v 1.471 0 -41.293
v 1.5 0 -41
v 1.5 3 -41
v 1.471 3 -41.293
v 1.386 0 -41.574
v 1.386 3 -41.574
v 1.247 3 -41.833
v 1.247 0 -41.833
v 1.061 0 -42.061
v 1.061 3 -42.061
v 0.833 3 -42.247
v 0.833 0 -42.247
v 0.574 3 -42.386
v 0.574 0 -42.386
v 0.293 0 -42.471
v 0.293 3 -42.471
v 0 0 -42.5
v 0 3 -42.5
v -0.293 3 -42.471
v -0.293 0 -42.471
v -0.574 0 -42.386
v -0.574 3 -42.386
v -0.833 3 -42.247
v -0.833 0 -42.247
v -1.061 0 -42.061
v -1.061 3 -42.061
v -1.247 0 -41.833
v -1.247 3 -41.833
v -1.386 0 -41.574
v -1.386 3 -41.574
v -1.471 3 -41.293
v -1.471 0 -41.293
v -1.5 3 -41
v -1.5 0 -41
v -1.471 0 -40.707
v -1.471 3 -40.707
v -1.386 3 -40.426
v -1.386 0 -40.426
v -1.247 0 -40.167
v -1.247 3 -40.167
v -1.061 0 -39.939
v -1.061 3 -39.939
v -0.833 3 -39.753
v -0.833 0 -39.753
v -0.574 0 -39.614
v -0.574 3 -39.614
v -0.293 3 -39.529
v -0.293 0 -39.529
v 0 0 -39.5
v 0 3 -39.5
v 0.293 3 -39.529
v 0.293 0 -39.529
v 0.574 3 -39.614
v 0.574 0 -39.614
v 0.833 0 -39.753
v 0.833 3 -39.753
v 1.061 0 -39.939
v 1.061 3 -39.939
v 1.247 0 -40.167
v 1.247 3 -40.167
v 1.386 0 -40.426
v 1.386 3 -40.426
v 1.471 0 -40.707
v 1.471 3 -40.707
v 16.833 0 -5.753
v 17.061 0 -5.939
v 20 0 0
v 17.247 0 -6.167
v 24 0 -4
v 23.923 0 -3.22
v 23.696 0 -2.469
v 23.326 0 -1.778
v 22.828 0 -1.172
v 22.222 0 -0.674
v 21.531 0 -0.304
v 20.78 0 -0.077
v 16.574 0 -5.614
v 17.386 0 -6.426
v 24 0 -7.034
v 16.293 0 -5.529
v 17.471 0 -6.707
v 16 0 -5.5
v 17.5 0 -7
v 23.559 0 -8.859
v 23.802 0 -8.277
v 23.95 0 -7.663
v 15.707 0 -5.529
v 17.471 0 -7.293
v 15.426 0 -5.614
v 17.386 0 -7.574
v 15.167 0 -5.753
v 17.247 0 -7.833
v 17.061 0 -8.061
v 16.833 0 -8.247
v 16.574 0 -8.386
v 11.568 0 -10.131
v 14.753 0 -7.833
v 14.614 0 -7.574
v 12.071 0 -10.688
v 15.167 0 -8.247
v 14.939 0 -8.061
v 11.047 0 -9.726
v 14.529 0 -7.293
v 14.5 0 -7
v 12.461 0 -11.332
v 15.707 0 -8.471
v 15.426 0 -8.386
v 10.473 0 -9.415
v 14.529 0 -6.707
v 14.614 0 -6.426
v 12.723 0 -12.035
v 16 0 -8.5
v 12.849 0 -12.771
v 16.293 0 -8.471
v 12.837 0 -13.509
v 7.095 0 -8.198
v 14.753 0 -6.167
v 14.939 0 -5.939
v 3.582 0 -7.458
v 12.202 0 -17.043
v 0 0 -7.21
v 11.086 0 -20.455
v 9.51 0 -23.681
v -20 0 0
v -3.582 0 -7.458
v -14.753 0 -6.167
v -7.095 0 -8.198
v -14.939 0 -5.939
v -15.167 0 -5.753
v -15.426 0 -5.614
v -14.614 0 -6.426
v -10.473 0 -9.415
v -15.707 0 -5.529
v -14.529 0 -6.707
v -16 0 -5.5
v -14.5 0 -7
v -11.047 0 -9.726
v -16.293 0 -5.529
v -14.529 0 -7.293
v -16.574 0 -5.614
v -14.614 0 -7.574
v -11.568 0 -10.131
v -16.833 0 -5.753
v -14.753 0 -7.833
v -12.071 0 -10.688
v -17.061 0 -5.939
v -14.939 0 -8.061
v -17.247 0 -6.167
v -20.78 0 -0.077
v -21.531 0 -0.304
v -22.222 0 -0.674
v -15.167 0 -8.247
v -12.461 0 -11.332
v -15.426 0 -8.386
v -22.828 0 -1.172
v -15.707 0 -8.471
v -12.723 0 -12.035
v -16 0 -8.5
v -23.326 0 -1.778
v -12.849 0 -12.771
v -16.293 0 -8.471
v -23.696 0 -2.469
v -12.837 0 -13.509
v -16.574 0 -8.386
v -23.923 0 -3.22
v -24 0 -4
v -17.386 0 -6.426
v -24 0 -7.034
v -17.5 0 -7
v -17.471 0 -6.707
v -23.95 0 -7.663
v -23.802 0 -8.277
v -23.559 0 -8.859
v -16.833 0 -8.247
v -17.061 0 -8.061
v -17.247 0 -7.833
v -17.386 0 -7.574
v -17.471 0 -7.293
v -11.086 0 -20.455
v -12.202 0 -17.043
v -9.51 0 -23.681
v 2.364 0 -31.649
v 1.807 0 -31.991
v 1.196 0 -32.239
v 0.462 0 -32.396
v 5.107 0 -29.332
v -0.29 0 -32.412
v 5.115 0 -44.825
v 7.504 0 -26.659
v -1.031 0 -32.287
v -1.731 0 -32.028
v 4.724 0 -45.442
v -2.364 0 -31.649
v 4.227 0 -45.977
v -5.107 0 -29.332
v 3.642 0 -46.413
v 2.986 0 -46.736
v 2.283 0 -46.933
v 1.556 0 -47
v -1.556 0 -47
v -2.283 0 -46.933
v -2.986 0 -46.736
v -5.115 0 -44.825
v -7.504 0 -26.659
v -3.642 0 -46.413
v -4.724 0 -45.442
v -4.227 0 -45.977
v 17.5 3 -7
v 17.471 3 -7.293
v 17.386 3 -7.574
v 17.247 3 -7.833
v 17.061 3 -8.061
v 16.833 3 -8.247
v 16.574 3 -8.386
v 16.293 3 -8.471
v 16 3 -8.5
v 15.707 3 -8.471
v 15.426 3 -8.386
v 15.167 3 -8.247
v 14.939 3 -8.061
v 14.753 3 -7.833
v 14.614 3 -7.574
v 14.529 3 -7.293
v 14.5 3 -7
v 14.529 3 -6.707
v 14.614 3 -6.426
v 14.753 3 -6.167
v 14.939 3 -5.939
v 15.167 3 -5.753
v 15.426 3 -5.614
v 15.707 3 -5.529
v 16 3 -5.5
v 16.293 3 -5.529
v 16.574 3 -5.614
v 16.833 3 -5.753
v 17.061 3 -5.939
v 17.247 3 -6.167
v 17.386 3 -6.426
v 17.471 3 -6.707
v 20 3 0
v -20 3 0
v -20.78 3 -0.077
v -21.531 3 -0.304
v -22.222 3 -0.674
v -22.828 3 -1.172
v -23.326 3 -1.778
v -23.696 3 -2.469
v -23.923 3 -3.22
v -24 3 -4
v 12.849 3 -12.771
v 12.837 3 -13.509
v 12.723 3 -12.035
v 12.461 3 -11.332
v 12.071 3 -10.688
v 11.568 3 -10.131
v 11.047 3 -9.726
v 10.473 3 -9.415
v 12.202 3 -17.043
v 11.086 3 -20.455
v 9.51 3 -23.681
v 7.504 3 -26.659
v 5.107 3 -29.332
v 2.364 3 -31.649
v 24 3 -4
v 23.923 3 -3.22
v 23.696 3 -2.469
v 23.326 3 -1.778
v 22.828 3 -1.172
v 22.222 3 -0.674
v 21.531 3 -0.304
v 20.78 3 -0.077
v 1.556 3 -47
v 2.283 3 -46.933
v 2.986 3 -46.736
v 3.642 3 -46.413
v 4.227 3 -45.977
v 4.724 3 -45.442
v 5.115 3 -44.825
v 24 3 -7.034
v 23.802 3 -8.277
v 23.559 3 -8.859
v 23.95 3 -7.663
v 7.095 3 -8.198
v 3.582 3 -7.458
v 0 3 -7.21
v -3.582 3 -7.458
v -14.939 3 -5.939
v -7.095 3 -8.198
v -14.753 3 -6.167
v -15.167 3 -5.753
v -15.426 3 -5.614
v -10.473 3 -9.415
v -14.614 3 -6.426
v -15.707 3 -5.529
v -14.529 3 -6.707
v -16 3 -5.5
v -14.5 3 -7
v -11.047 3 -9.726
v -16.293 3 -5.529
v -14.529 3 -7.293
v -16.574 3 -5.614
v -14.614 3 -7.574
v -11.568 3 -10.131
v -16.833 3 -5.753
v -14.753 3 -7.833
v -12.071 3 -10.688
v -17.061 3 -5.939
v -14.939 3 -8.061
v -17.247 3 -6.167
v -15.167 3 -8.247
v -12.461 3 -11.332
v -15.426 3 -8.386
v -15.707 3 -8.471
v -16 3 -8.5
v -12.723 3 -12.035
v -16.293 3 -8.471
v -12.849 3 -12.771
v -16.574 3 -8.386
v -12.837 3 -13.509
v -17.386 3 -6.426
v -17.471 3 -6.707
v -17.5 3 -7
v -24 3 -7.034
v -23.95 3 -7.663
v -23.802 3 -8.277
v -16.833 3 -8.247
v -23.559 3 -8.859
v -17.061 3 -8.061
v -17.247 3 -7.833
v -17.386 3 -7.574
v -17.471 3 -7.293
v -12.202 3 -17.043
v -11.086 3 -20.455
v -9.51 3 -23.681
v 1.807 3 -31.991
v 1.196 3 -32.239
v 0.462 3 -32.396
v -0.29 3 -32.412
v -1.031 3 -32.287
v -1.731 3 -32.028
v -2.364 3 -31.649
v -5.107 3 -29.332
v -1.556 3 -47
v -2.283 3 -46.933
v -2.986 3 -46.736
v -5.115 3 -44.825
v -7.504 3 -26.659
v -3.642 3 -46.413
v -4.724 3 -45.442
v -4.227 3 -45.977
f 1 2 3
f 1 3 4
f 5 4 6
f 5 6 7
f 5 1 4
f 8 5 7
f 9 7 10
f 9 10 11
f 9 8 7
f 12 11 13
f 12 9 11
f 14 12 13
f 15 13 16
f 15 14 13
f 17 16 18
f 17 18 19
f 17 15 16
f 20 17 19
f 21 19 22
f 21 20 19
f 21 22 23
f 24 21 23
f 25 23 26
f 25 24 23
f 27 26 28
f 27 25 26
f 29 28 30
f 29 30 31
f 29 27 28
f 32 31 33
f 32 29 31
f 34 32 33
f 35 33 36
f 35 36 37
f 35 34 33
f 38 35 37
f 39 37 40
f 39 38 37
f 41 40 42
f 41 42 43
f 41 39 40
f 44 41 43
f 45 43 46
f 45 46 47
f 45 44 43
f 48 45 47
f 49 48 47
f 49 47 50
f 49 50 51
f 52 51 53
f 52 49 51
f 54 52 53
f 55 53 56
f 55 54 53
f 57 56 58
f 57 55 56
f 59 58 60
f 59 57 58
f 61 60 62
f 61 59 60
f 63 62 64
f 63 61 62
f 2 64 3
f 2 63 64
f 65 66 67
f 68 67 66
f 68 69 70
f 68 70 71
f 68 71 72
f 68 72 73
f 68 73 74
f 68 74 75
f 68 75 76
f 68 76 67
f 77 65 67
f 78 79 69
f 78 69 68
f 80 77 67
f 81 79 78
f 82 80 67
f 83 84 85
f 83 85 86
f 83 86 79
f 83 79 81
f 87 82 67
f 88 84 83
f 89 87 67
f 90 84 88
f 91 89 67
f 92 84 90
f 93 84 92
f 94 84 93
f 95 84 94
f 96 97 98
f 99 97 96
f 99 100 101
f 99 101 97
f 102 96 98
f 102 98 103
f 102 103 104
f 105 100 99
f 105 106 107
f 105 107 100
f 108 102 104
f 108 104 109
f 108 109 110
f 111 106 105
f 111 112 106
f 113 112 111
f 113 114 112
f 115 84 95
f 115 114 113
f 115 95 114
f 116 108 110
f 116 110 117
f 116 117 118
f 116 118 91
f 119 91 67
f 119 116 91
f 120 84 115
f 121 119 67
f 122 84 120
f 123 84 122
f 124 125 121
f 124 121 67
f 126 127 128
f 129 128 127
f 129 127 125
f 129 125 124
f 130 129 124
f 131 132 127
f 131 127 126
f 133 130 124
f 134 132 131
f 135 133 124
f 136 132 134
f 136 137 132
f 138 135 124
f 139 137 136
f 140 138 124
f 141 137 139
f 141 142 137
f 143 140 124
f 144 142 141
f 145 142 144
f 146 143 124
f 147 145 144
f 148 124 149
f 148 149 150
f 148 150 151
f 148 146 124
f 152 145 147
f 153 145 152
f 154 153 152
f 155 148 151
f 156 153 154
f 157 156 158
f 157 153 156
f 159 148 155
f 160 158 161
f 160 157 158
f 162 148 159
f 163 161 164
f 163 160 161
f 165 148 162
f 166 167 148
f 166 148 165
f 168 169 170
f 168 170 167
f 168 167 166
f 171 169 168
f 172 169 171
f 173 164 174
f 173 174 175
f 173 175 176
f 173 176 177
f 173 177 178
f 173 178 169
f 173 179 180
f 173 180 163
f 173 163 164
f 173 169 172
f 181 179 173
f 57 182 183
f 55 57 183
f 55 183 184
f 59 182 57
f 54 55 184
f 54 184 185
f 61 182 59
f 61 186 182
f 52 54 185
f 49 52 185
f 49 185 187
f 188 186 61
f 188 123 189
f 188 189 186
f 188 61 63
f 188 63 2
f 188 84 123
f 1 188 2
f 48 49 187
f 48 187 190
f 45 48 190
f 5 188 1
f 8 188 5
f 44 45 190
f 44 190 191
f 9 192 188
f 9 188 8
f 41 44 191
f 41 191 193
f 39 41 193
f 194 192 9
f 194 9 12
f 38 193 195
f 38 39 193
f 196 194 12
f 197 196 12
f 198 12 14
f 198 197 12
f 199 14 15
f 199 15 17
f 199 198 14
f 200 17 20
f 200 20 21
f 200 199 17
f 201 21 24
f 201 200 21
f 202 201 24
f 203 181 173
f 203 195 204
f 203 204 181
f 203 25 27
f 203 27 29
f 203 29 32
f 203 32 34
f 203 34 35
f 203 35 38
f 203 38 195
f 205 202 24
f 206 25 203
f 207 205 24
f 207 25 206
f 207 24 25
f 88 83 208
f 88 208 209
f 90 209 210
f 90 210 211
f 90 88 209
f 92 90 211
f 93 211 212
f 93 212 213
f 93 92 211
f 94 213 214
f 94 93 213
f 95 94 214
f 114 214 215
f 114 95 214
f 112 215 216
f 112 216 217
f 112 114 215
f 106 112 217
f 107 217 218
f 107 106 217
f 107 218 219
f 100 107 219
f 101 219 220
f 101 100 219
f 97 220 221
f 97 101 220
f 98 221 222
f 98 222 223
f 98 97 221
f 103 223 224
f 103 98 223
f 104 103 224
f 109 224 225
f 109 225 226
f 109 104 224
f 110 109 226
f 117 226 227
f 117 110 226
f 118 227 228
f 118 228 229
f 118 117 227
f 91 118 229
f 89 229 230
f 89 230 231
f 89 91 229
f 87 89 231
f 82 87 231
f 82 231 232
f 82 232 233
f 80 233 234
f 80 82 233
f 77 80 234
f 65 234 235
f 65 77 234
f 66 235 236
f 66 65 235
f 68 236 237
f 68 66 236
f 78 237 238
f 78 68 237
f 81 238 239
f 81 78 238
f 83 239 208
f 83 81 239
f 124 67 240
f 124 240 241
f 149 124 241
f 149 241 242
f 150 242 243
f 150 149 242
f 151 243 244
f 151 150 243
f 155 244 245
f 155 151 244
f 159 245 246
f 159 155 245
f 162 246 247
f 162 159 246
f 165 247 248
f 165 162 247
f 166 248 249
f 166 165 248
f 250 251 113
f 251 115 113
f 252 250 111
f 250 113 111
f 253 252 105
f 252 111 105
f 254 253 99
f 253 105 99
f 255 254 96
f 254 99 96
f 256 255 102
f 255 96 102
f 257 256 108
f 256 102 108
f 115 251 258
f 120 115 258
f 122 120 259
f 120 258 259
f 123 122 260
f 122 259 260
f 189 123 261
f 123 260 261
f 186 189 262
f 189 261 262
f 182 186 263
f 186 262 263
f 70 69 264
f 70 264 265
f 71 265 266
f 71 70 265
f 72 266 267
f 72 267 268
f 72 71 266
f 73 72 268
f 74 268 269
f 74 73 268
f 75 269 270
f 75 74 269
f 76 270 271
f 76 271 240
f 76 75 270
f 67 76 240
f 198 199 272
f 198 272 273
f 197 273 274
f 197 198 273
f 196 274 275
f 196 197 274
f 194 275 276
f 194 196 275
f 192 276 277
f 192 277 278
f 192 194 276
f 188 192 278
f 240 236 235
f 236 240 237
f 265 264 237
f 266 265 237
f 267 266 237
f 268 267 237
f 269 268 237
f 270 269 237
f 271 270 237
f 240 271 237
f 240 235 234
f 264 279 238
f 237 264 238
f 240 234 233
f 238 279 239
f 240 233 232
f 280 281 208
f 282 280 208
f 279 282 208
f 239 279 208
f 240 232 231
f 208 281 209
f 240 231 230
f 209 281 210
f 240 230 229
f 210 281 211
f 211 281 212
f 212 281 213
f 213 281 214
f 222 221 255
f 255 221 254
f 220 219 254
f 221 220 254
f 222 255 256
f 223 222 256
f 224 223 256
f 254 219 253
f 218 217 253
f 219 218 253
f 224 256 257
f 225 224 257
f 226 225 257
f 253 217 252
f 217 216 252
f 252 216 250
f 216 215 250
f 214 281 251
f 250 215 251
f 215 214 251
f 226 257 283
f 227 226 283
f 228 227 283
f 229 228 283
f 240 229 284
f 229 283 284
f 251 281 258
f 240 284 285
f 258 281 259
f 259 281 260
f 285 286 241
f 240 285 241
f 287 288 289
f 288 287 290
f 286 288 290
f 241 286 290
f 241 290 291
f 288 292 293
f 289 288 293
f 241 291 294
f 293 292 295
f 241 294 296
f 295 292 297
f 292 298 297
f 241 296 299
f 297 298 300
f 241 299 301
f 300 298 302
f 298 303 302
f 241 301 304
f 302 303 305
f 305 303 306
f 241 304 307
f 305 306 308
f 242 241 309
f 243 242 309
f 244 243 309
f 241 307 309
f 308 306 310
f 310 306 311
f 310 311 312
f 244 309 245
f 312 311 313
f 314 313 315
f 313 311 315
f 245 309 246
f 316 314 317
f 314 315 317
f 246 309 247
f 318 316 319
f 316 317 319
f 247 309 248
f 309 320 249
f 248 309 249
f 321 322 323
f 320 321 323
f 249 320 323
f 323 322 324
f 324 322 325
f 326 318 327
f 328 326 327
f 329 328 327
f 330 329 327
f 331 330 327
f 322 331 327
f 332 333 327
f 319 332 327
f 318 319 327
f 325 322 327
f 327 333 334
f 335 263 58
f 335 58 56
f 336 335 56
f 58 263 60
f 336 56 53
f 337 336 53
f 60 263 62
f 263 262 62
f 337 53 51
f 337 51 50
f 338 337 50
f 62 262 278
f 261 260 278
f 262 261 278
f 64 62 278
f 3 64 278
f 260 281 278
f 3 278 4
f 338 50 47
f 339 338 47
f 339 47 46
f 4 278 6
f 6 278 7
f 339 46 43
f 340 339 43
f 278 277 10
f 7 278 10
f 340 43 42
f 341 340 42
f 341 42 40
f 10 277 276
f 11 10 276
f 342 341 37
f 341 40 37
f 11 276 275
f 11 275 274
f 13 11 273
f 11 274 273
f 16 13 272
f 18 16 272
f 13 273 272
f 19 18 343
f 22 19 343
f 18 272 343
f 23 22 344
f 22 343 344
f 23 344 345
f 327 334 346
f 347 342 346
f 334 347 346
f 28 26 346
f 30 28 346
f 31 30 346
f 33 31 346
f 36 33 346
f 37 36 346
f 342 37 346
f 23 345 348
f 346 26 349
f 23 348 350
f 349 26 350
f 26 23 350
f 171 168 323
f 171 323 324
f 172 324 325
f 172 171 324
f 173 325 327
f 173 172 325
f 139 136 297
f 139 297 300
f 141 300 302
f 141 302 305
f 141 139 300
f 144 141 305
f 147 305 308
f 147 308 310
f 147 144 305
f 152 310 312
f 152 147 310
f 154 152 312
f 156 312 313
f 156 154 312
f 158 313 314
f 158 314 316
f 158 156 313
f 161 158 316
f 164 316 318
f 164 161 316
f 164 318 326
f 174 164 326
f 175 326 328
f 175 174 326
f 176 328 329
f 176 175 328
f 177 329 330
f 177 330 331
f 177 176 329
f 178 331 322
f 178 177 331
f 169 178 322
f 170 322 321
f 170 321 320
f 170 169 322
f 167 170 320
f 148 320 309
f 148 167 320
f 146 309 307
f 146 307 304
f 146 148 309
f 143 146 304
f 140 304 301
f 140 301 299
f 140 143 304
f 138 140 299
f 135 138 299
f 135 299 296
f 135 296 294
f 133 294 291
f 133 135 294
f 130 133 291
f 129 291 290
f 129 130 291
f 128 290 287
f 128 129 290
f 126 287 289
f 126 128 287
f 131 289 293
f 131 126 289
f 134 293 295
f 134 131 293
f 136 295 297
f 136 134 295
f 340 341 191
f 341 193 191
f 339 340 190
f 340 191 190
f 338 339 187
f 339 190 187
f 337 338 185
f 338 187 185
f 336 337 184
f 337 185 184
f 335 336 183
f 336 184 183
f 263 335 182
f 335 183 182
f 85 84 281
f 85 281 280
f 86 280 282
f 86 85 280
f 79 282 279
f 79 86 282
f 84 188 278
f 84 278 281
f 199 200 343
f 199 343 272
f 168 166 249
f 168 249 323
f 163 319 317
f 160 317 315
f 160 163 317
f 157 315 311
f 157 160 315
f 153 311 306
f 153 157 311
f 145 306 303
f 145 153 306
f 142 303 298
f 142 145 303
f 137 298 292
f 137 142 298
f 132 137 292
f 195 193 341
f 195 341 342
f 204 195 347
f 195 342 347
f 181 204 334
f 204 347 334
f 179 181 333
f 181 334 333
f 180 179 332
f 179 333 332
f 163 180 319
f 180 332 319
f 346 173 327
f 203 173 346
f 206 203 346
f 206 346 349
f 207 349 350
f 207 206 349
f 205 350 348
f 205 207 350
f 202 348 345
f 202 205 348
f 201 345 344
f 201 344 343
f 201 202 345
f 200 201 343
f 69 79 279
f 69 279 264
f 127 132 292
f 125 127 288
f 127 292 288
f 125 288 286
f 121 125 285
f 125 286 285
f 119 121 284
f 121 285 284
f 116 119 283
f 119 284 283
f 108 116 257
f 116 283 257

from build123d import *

# Parameters (mm, degrees)
SKETCH1_R           = 1.5
BOSS_EXTRUDE1_DEPTH = 3
CUT_EXTRUDE1_DEPTH  = 3
FILLET1_R           = 4


with BuildPart() as part:
    # Sketch1 → Boss-Extrude1 (new body)
    with BuildSketch(Plane(origin=(0, 0, 0), x_dir=(1, 0, 0), z_dir=(0, 1, 0))):
        with BuildLine():
            Line((0, 0), (-20, 0))
            ThreePointArc((-20, 0), (-22.828427125, 1.171572875), (-24, 4))
            Line((-24, 4), (-24, 7.0341572))
            ThreePointArc((-24, 7.0341572), (-23.888256641, 7.97301837), (-23.559269851, 8.85942379))
            Line((-23.559269851, 8.85942379), (-5.115247902, 44.82526659))
            ThreePointArc((-5.115247902, 44.82526659), (-3.641515588, 46.413287738), (-1.555978051, 47))
            Line((-1.555978051, 47), (1.555978051, 47))
            ThreePointArc((1.555978051, 47), (3.641515588, 46.413287738), (5.115247902, 44.82526659))
            Line((5.115247902, 44.82526659), (23.559269851, 8.85942379))
            ThreePointArc((23.559269851, 8.85942379), (23.888256641, 7.97301837), (24, 7.0341572))
            Line((24, 7.0341572), (24, 4))
            ThreePointArc((24, 4), (22.828427125, 1.171572875), (20, 0))
            Line((20, 0), (0, 0))
        make_face()
        with Locations((-16, 7)):
            Circle(SKETCH1_R, mode=Mode.SUBTRACT)
        with Locations((0, 41)):
            Circle(SKETCH1_R, mode=Mode.SUBTRACT)
        with Locations((16, 7)):
            Circle(SKETCH1_R, mode=Mode.SUBTRACT)
    extrude(amount=BOSS_EXTRUDE1_DEPTH)

    # Sketch2 → Cut-Extrude1 (cut)
    with BuildSketch(Plane(origin=(0, 3, 0), x_dir=(1, 0, 0), z_dir=(0, 1, 0))):
        with BuildLine():
            ThreePointArc((-12.990381057, 10.690853285), (0, 7.210091171), (12.990381057, 10.690853285))
            ThreePointArc((12.990381057, 10.690853285), (9.509618943, 23.681234342), (0, 33.190853285))
            ThreePointArc((0, 33.190853285), (-9.509618943, 23.681234342), (-12.990381057, 10.690853285))
        make_face()
    extrude(amount=-CUT_EXTRUDE1_DEPTH, mode=Mode.SUBTRACT)

    # Fillet1
    fillet1_edges = [part.edges().sort_by_distance(p)[0] for p in [
        (-12.990381057, 1.5, -10.690853285),
        (0, 1.5, -33.190853285),
        (12.990381057, 1.5, -10.690853285),
    ]]
    fillet(fillet1_edges, radius=FILLET1_R)


solid = part.part
